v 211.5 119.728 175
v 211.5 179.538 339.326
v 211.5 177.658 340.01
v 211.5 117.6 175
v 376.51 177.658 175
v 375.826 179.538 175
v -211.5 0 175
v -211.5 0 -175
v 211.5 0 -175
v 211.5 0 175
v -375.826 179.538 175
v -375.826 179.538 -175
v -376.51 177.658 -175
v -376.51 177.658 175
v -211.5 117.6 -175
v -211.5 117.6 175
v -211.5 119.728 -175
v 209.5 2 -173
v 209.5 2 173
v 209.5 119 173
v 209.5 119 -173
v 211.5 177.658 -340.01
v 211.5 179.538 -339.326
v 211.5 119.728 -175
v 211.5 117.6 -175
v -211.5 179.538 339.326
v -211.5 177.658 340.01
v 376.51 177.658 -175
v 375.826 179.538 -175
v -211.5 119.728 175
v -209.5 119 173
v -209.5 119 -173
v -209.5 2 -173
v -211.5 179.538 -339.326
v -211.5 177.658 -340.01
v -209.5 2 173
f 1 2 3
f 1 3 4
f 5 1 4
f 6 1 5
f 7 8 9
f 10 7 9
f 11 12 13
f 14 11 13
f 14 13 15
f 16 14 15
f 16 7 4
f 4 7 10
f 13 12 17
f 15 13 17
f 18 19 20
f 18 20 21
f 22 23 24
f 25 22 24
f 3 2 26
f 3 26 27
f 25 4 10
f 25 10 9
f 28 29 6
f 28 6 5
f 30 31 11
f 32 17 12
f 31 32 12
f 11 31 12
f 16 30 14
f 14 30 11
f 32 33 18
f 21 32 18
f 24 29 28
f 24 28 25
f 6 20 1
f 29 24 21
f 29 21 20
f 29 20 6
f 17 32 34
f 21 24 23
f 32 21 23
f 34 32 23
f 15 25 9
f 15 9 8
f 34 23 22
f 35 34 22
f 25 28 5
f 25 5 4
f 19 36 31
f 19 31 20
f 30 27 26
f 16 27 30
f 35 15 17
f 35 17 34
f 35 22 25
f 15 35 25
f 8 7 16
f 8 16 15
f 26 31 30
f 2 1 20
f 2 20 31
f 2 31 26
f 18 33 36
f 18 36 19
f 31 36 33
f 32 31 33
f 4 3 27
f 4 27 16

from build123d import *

# Parameters (mm, degrees)
SKETCH1_W           = 423
SKETCH1_H           = 350
BOSS_EXTRUDE1_DEPTH = 119
SHELL1_T            = -2
BOSS_EXTRUDE2_REACH = 474.985
BOSS_EXTRUDE3_REACH = 586.979


with BuildPart() as part:
    # Sketch1 → Boss-Extrude1 (new body)
    with BuildSketch(Plane(origin=(0, 0, 0), x_dir=(1, 0, 0), z_dir=(0, 1, 0))):
        Rectangle(SKETCH1_W, SKETCH1_H)
    extrude(amount=BOSS_EXTRUDE1_DEPTH)

    # Shell1
    shell1_openings = [part.faces().sort_by_distance(p)[0] for p in [
        (0, 119, 0),
    ]]
    offset(amount=SHELL1_T, openings=shell1_openings, kind=Kind.INTERSECTION)

    # Boss-Extrude2: up to this face of the body (flat: up to its plane)
    boss_extrude2_end = Plane(part.part.faces().sort_by_distance((-211.5, 59.5, 0))[0])
    # Sketch2 → Boss-Extrude2 (add, up to the picked face)
    with BuildSketch(Plane(origin=(211.5, 0, 0), x_dir=(0, 0, -1), z_dir=(1, 0, 0)), mode=Mode.PRIVATE) as boss_extrude2_sk1:
        Polygon((-173, 119), (-339.325593879, 179.537565369), (-340.009634166, 177.658180127), (-173.684040287, 117.120614758), align=None)
    boss_extrude2_tool1 = split(extrude(boss_extrude2_sk1.sketch, amount=-BOSS_EXTRUDE2_REACH, mode=Mode.PRIVATE), bisect_by=boss_extrude2_end, keep=Keep.BOTH, mode=Mode.PRIVATE)
    boss_extrude2 = boss_extrude2_tool1.solids().sort_by(Axis((211.5, 148.32909, 256.504817), (-1, 0, 0)))[0]
    add(boss_extrude2)

    # Boss-Extrude3: up to this face of the body (flat: up to its plane)
    boss_extrude3_end = Plane(part.part.faces().sort_by_distance((0, 58.799792462, 175))[0])
    # Sketch4 → Boss-Extrude3 (add, up to the picked face)
    with BuildSketch(Plane(origin=(0, 0, -175), x_dir=(-1, 0, 0), z_dir=(0, 0, -1)), mode=Mode.PRIVATE) as boss_extrude3_sk1:
        Polygon((-209.5, 119), (-375.825593879, 179.537565369), (-376.509634166, 177.658180127), (-210.184040287, 117.120614758), align=None)
    boss_extrude3_tool1 = split(extrude(boss_extrude3_sk1.sketch, amount=-BOSS_EXTRUDE3_REACH, mode=Mode.PRIVATE), bisect_by=boss_extrude3_end, keep=Keep.BOTH, mode=Mode.PRIVATE)
    boss_extrude3 = boss_extrude3_tool1.solids().sort_by(Axis((293.004817, 148.32909, -175), (0, 0, 1)))[0]
    add(boss_extrude3)

    # Mirror1: Boss-Extrude2 across plane
    add(boss_extrude2.mirror(Plane.XY))

    # Mirror2: Boss-Extrude3 across plane
    add(boss_extrude3.mirror(Plane(origin=(0, 0, 0), x_dir=(0, 0, 1), z_dir=(1, 0, 0))))


solid = part.part
